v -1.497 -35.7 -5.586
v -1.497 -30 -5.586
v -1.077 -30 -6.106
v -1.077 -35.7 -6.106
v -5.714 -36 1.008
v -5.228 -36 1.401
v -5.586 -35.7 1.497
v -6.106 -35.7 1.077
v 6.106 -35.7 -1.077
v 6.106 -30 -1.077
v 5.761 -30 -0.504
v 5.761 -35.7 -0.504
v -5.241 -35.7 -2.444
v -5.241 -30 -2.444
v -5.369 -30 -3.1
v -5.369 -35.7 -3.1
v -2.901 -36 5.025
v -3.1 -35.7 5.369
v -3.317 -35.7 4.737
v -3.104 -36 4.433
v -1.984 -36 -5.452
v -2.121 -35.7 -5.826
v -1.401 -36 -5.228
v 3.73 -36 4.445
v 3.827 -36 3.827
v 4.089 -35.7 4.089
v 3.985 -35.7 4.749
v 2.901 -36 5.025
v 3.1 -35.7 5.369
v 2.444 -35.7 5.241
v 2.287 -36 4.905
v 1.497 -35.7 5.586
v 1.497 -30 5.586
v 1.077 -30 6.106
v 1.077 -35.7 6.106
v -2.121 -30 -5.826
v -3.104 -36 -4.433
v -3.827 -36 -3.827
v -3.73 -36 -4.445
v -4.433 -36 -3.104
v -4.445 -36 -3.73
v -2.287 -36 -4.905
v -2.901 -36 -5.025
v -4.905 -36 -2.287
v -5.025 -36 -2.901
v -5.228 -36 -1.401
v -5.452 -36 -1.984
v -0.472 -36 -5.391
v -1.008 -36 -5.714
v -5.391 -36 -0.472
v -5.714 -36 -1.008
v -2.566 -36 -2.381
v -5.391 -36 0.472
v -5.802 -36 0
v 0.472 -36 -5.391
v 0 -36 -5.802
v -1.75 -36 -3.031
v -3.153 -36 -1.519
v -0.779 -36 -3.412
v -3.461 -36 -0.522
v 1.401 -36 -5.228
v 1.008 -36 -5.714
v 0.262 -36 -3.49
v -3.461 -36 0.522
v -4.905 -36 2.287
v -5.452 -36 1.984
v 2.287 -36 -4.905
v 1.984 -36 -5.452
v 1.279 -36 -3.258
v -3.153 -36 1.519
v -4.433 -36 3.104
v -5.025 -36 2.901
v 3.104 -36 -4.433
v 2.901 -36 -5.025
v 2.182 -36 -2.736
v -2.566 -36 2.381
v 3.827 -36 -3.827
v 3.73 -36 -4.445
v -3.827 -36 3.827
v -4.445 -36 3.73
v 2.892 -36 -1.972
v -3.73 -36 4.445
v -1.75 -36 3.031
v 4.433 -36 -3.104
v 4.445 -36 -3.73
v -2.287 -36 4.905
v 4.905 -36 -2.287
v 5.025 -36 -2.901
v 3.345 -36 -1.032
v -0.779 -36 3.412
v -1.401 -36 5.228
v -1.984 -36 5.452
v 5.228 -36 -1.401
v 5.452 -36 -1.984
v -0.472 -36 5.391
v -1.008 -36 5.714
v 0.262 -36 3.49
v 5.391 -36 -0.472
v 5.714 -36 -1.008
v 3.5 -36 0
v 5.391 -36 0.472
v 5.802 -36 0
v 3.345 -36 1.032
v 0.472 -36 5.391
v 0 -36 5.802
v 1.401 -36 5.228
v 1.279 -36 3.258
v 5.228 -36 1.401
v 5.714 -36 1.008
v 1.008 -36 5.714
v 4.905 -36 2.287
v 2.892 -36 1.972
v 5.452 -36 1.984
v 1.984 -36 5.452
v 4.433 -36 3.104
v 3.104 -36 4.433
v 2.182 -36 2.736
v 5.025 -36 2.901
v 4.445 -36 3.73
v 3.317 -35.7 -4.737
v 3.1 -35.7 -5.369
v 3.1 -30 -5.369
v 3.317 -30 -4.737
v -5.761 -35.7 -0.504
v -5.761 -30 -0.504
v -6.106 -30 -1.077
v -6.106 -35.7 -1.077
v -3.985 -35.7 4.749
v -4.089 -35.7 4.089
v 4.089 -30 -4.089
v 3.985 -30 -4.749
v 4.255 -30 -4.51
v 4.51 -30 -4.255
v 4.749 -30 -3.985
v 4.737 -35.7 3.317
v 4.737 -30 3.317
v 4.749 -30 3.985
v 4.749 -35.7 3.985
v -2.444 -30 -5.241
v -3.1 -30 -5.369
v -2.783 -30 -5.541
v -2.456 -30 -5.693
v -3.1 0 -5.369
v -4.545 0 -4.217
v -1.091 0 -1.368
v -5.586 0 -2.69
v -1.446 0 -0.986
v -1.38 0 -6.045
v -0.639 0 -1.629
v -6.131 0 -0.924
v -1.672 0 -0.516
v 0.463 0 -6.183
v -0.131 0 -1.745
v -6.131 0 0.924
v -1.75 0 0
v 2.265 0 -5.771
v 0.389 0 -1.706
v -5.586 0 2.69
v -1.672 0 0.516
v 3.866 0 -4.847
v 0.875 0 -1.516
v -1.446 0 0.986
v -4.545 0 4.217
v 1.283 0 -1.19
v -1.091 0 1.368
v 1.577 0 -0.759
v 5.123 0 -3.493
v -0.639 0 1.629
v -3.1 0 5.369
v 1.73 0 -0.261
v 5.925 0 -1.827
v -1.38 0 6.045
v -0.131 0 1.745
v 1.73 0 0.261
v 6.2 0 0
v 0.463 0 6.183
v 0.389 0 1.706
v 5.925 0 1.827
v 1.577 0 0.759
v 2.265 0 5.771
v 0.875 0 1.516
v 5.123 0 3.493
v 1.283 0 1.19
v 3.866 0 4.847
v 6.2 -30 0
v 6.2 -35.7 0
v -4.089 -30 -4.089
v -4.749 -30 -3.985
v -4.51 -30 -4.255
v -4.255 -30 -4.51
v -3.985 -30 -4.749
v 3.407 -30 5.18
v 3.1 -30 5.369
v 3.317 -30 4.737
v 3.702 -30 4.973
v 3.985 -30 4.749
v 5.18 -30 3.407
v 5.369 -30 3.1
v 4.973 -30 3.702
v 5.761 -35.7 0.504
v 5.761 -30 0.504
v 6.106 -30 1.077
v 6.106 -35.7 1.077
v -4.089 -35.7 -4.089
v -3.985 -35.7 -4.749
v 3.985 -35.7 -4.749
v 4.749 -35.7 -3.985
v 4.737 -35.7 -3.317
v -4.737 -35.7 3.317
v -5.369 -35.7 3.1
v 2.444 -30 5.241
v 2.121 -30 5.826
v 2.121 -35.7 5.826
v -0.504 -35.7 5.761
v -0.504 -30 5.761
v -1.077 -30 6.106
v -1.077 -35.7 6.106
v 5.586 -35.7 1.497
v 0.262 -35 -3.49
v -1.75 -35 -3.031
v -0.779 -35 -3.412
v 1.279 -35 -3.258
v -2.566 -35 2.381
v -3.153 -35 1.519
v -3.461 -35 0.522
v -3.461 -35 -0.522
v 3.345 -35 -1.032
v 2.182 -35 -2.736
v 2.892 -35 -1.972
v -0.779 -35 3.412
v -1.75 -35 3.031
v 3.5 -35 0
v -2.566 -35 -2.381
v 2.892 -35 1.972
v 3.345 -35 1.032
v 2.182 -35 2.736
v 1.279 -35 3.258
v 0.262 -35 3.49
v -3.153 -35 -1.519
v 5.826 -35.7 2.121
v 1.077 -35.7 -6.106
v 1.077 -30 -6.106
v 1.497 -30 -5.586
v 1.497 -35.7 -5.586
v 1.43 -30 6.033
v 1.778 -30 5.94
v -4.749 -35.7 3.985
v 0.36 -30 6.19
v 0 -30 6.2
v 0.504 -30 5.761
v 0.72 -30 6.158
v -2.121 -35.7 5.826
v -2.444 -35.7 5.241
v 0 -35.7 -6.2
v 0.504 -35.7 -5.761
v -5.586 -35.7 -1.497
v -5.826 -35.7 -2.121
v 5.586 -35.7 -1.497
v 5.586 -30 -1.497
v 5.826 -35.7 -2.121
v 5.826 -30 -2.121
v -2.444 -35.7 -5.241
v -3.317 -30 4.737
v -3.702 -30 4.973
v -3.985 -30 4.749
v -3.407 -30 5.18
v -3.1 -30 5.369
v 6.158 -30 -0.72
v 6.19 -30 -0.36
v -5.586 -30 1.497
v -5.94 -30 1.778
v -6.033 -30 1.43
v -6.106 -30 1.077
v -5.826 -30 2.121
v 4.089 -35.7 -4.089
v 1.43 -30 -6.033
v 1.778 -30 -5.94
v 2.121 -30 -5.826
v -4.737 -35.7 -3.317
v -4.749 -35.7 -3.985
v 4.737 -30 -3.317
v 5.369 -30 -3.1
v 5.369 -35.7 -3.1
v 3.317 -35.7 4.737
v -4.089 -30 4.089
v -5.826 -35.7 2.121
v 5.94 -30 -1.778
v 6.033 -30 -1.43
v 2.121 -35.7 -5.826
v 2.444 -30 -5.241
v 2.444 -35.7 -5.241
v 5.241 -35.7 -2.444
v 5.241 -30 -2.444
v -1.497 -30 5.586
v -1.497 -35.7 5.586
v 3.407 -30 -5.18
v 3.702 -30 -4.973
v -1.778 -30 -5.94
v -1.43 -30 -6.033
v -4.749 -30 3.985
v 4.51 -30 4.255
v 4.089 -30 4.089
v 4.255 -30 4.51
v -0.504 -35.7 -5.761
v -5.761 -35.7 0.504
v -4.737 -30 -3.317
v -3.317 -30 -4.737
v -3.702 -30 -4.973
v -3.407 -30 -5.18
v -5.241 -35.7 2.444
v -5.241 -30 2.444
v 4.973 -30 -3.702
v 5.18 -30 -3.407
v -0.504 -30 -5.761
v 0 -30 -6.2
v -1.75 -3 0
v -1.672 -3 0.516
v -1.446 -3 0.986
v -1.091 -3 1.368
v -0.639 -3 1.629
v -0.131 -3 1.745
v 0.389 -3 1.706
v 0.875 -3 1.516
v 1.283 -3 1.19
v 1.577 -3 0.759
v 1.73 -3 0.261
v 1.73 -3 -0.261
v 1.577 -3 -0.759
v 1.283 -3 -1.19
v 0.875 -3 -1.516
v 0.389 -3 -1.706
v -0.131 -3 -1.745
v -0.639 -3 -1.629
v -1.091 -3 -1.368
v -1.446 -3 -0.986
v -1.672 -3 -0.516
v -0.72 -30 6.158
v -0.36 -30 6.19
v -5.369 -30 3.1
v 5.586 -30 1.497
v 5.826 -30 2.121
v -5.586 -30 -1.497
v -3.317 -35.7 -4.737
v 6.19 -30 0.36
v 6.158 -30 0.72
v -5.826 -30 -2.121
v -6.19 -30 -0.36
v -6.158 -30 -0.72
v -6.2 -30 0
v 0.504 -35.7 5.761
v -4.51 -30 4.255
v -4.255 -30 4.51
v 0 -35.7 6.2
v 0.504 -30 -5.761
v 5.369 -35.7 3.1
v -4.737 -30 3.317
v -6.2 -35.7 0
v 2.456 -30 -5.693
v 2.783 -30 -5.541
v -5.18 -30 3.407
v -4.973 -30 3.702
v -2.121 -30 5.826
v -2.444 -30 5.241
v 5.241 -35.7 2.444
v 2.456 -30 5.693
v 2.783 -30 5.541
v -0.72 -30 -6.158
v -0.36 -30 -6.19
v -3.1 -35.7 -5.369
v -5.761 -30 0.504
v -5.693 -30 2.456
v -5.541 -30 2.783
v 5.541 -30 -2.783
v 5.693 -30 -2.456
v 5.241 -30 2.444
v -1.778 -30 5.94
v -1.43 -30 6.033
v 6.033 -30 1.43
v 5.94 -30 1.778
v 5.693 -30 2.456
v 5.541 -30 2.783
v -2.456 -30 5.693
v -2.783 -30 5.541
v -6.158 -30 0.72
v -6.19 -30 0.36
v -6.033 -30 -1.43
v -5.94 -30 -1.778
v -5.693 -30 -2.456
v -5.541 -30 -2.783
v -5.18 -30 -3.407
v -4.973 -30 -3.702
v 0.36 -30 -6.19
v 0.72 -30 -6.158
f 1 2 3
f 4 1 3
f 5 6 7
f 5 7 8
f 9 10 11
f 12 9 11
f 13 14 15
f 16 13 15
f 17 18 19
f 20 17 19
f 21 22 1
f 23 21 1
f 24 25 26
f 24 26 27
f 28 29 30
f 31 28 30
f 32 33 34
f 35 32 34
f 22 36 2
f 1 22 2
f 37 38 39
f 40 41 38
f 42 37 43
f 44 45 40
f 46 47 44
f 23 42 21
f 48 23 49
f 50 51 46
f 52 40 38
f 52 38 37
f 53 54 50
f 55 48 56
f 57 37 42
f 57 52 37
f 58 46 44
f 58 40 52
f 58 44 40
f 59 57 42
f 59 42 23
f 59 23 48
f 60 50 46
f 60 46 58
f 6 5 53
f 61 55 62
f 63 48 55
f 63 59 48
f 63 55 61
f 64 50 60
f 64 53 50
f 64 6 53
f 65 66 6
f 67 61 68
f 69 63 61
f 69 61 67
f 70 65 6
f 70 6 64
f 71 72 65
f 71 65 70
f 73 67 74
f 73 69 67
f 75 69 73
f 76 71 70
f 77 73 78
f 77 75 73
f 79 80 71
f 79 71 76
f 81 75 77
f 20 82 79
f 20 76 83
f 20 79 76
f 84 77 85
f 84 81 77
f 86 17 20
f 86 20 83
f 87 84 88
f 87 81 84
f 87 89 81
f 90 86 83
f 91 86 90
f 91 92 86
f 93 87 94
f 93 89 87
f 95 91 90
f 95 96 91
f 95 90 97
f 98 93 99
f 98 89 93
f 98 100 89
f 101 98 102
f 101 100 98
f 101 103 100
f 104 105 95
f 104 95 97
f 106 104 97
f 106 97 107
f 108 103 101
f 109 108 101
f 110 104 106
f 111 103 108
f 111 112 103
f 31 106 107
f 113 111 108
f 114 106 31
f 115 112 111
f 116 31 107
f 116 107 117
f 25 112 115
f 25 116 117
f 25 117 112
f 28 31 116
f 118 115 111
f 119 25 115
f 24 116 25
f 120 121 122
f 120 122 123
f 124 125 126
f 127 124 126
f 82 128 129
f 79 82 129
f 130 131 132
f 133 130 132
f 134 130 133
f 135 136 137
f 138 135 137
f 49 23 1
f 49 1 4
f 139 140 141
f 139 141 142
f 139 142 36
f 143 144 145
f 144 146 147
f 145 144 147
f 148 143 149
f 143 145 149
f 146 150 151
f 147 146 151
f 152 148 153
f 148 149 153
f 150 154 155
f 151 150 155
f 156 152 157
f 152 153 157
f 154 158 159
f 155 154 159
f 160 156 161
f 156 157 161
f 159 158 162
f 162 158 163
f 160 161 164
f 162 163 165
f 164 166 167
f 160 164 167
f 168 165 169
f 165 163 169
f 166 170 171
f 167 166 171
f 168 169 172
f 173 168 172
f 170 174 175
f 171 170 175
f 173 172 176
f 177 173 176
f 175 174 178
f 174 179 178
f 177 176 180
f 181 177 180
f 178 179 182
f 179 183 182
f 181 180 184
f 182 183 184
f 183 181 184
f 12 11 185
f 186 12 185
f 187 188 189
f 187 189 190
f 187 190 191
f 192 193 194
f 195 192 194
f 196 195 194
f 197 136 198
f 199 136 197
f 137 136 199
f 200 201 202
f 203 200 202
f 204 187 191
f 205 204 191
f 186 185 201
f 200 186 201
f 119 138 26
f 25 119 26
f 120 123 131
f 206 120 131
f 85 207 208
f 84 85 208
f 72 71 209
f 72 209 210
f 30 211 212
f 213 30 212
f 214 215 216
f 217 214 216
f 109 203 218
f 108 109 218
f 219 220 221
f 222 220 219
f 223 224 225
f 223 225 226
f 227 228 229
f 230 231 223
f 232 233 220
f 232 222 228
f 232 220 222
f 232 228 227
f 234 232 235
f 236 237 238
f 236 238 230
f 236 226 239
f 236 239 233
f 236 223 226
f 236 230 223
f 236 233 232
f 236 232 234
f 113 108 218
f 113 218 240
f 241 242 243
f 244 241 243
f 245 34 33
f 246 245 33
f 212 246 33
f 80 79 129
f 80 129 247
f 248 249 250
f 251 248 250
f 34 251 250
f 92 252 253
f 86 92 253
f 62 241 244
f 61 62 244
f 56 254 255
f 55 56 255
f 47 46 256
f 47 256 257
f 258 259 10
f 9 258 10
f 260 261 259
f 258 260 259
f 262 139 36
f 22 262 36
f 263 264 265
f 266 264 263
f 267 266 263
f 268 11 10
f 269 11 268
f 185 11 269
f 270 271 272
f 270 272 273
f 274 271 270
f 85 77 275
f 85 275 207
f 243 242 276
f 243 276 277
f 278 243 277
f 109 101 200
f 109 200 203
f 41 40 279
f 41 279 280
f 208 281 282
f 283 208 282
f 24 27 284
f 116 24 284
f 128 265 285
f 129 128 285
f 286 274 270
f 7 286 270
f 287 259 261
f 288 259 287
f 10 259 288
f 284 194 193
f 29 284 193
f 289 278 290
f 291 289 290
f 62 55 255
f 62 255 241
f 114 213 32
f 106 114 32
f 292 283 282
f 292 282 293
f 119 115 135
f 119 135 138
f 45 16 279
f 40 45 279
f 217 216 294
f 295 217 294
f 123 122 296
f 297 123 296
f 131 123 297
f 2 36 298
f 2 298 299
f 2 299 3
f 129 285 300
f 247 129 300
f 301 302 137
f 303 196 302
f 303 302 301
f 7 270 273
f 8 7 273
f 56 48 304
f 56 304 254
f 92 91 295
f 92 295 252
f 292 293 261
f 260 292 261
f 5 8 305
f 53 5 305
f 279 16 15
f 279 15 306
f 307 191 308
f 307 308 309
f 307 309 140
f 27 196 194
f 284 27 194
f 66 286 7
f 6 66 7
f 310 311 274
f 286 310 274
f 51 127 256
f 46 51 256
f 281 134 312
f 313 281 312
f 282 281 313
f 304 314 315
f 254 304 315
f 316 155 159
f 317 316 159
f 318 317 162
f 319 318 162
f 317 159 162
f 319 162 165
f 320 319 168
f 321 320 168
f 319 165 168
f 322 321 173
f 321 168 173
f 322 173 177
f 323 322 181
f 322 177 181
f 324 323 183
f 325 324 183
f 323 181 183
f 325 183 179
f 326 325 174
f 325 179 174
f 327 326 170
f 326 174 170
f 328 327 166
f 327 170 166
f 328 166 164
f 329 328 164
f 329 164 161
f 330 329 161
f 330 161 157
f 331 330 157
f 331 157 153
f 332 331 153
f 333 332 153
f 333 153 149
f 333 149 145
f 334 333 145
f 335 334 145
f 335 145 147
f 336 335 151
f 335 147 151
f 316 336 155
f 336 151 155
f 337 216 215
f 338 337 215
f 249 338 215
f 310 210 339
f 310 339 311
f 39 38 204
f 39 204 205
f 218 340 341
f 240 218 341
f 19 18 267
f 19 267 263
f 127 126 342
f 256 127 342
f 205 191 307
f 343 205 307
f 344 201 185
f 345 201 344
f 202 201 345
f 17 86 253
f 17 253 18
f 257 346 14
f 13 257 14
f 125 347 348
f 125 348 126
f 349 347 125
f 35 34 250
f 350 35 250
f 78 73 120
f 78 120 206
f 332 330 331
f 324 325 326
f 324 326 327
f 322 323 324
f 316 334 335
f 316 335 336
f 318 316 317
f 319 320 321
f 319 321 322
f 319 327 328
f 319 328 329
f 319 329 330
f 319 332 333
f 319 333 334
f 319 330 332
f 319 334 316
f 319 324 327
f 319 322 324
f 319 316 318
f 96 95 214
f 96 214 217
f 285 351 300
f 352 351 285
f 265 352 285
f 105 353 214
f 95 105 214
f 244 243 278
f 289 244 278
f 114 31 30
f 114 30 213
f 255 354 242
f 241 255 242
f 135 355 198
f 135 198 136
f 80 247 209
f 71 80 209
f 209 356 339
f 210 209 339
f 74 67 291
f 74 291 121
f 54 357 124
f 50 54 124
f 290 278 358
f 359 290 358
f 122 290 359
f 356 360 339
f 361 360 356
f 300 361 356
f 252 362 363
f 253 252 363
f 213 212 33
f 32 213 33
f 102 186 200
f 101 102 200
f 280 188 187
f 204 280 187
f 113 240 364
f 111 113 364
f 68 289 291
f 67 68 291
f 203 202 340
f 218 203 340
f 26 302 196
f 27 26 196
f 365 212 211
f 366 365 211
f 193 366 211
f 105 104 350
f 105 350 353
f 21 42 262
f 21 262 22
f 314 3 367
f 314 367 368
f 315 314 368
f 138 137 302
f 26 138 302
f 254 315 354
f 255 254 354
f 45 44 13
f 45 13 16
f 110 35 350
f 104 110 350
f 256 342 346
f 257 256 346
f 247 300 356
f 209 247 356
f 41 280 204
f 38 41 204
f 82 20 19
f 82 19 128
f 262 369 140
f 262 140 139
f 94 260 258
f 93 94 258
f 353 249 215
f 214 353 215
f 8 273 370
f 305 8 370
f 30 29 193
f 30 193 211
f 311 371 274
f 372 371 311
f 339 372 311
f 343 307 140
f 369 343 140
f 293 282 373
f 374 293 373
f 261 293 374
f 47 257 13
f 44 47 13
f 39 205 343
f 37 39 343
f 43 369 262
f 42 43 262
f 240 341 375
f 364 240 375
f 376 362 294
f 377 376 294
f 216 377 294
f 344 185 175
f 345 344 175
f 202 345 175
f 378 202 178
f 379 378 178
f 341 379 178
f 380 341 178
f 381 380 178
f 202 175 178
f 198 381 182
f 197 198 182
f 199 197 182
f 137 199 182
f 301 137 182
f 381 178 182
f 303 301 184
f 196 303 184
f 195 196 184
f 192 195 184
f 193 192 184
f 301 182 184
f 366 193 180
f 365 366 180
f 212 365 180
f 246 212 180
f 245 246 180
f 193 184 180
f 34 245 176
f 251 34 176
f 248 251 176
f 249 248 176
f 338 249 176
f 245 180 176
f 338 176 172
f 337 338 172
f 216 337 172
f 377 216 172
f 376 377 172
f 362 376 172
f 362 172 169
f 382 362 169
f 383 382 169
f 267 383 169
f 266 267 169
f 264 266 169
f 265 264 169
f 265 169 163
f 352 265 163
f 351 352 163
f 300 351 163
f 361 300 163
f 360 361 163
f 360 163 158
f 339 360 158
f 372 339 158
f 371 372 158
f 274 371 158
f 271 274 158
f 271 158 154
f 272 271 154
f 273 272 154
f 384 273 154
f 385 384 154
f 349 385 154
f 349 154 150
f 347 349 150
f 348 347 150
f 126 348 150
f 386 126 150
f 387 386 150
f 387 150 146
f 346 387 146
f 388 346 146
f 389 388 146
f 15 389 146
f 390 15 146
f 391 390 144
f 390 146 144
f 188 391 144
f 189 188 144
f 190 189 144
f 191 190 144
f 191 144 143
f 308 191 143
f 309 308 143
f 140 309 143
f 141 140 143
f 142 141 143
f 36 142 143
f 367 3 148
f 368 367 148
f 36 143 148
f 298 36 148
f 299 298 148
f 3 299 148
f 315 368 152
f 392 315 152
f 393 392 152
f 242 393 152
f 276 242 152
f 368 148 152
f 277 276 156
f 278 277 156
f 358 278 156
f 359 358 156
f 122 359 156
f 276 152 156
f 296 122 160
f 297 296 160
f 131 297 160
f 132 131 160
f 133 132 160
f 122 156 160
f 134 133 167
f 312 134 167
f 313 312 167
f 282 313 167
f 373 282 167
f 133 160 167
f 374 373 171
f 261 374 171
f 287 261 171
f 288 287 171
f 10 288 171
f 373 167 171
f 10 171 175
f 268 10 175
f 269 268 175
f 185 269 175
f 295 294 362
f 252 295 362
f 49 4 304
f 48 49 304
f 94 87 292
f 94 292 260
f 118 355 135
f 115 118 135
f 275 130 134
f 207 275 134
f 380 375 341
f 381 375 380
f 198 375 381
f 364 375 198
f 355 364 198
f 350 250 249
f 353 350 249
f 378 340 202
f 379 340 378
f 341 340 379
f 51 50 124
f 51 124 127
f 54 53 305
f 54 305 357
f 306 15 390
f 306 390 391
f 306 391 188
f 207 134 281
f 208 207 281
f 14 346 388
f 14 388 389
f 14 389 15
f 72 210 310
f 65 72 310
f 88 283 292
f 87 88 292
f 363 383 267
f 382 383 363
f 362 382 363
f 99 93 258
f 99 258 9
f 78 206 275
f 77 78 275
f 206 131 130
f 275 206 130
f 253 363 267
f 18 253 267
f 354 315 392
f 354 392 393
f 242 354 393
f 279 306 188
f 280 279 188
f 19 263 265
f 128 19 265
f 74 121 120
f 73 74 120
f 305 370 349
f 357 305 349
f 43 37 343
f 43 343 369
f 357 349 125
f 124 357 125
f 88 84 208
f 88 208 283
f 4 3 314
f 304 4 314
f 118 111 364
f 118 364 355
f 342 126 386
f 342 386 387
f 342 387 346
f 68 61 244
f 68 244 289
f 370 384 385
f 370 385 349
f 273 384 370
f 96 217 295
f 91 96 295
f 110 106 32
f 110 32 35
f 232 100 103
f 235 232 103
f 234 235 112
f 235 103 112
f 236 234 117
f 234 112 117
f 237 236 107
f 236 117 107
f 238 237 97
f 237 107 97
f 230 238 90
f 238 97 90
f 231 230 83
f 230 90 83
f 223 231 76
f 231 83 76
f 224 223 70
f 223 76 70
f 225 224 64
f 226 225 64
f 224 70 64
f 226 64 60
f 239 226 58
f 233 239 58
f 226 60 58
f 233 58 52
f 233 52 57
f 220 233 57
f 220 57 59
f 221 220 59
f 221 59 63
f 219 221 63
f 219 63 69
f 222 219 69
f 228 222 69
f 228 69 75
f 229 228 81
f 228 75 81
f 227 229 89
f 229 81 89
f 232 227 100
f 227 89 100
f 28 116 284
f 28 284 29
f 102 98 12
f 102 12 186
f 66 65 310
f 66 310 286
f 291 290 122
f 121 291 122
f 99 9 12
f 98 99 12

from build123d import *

# Parameters (mm, degrees)
F0_R     = 6.2
F1_DEPTH = 30
F3_DEPTH = 6
F4_SIZE  = 0.3
F5_R     = 3.5
F6_DEPTH = 1
F7_R     = 1.75
F8_DEPTH = 3


with BuildPart() as f1:
    # F0 (on Front) → F1 (new body)
    with BuildSketch(Plane.XZ):
        Circle(F0_R)
    extrude(amount=F1_DEPTH)

    # F2 (on face) → F3 (join)
    with BuildSketch(Plane.XZ.offset(30)):
        Polygon((5.761109, -0.504032), (6.2, 0), (5.761109, 0.504032), (6.105808, 1.076619), (5.586061, 1.496781), (5.826094, 2.120525), (5.241283, 2.44405), (5.369358, 3.1), (4.737251, 3.317059), (4.749476, 3.985283), (4.08928, 4.08928), (3.985283, 4.749476), (3.317059, 4.737251), (3.1, 5.369358), (2.44405, 5.241283), (2.120525, 5.826094), (1.496781, 5.586061), (1.076619, 6.105808), (0.504032, 5.761109), (0, 6.2), (-0.504032, 5.761109), (-1.076619, 6.105808), (-1.496781, 5.586061), (-2.120525, 5.826094), (-2.44405, 5.241283), (-3.1, 5.369358), (-3.317059, 4.737251), (-3.985283, 4.749476), (-4.08928, 4.08928), (-4.749476, 3.985283), (-4.737251, 3.317059), (-5.369358, 3.1), (-5.241283, 2.44405), (-5.826094, 2.120525), (-5.586061, 1.496781), (-6.105808, 1.076619), (-5.761109, 0.504032), (-6.2, 0), (-5.761109, -0.504032), (-6.105808, -1.076619), (-5.586061, -1.496781), (-5.826094, -2.120525), (-5.241283, -2.44405), (-5.369358, -3.1), (-4.737251, -3.317059), (-4.749476, -3.985283), (-4.08928, -4.08928), (-3.985283, -4.749476), (-3.317059, -4.737251), (-3.1, -5.369358), (-2.44405, -5.241283), (-2.120525, -5.826094), (-1.496781, -5.586061), (-1.076619, -6.105808), (-0.504032, -5.761109), (0, -6.2), (0.504032, -5.761109), (1.076619, -6.105808), (1.496781, -5.586061), (2.120525, -5.826094), (2.44405, -5.241283), (3.1, -5.369358), (3.317059, -4.737251), (3.985283, -4.749476), (4.08928, -4.08928), (4.749476, -3.985283), (4.737251, -3.317059), (5.369358, -3.1), (5.241283, -2.44405), (5.826094, -2.120525), (5.586061, -1.496781), (6.105808, -1.076619), align=None)
    extrude(amount=F3_DEPTH)

    # F4
    f4_edges = [f1.edges().sort_by_distance(p)[0] for p in [
        (3.651171, -36, -4.743363),
        (4.037282, -36, -4.419378),
        (4.419378, -36, -4.037282),
        (4.743363, -36, -3.651171),
        (5.053304, -36, -3.208529),
        (5.30532, -36, -2.772025),
        (5.533689, -36, -2.282288),
        (5.706078, -36, -1.808653),
        (5.845934, -36, -1.2867),
        (5.933459, -36, -0.790325),
        (5.980555, -36, -0.252016),
        (5.980555, -36, 0.252016),
        (5.933459, -36, 0.790325),
        (5.845934, -36, 1.2867),
        (5.706078, -36, 1.808653),
        (5.533689, -36, 2.282288),
        (5.30532, -36, 2.772025),
        (5.053304, -36, 3.208529),
        (4.743363, -36, 3.651171),
        (4.419378, -36, 4.037282),
        (4.037282, -36, 4.419378),
        (3.651171, -36, 4.743363),
        (3.208529, -36, 5.053304),
        (2.772025, -36, 5.30532),
        (2.282288, -36, 5.533689),
        (1.808653, -36, 5.706078),
        (1.2867, -36, 5.845934),
        (0.790325, -36, 5.933459),
        (0.252016, -36, 5.980555),
        (-0.252016, -36, 5.980555),
        (-0.790325, -36, 5.933459),
        (-1.2867, -36, 5.845934),
        (-1.808653, -36, 5.706078),
        (-2.282288, -36, 5.533689),
        (-2.772025, -36, 5.30532),
        (-3.208529, -36, 5.053304),
        (-3.651171, -36, 4.743363),
        (-4.037282, -36, 4.419378),
        (-4.419378, -36, 4.037282),
        (-4.743363, -36, 3.651171),
        (-5.053304, -36, 3.208529),
        (-5.30532, -36, 2.772025),
        (-5.533689, -36, 2.282288),
        (-5.706078, -36, 1.808653),
        (-5.845934, -36, 1.2867),
        (-5.933459, -36, 0.790325),
        (-5.980555, -36, 0.252016),
        (-5.980555, -36, -0.252016),
        (-5.933459, -36, -0.790325),
        (-5.845934, -36, -1.2867),
        (-5.706078, -36, -1.808653),
        (-5.533689, -36, -2.282288),
        (-5.30532, -36, -2.772025),
        (-5.053304, -36, -3.208529),
        (-4.743363, -36, -3.651171),
        (-4.419378, -36, -4.037282),
        (-4.037282, -36, -4.419378),
        (-3.651171, -36, -4.743363),
        (-3.208529, -36, -5.053304),
        (-2.772025, -36, -5.30532),
        (-2.282288, -36, -5.533689),
        (-1.808653, -36, -5.706078),
        (-1.2867, -36, -5.845934),
        (-0.790325, -36, -5.933459),
        (-0.252016, -36, -5.980555),
        (0.252016, -36, -5.980555),
        (0.790325, -36, -5.933459),
        (1.2867, -36, -5.845934),
        (1.808653, -36, -5.706078),
        (2.282288, -36, -5.533689),
        (2.772025, -36, -5.30532),
        (3.208529, -36, -5.053304),
    ]]
    chamfer(f4_edges, length=F4_SIZE)

    # F5 (on face) → F6 (cut)
    with BuildSketch(Plane.XZ.offset(36)):
        Circle(F5_R)
    extrude(amount=-F6_DEPTH, mode=Mode.SUBTRACT)

    # F7 (on face) → F8 (cut)
    with BuildSketch(Plane(origin=(0, 0, 0), x_dir=(-1, 0, 0), z_dir=(0, 1, 0))):
        Circle(F7_R)
    extrude(amount=-F8_DEPTH, mode=Mode.SUBTRACT)


solid = f1.part
